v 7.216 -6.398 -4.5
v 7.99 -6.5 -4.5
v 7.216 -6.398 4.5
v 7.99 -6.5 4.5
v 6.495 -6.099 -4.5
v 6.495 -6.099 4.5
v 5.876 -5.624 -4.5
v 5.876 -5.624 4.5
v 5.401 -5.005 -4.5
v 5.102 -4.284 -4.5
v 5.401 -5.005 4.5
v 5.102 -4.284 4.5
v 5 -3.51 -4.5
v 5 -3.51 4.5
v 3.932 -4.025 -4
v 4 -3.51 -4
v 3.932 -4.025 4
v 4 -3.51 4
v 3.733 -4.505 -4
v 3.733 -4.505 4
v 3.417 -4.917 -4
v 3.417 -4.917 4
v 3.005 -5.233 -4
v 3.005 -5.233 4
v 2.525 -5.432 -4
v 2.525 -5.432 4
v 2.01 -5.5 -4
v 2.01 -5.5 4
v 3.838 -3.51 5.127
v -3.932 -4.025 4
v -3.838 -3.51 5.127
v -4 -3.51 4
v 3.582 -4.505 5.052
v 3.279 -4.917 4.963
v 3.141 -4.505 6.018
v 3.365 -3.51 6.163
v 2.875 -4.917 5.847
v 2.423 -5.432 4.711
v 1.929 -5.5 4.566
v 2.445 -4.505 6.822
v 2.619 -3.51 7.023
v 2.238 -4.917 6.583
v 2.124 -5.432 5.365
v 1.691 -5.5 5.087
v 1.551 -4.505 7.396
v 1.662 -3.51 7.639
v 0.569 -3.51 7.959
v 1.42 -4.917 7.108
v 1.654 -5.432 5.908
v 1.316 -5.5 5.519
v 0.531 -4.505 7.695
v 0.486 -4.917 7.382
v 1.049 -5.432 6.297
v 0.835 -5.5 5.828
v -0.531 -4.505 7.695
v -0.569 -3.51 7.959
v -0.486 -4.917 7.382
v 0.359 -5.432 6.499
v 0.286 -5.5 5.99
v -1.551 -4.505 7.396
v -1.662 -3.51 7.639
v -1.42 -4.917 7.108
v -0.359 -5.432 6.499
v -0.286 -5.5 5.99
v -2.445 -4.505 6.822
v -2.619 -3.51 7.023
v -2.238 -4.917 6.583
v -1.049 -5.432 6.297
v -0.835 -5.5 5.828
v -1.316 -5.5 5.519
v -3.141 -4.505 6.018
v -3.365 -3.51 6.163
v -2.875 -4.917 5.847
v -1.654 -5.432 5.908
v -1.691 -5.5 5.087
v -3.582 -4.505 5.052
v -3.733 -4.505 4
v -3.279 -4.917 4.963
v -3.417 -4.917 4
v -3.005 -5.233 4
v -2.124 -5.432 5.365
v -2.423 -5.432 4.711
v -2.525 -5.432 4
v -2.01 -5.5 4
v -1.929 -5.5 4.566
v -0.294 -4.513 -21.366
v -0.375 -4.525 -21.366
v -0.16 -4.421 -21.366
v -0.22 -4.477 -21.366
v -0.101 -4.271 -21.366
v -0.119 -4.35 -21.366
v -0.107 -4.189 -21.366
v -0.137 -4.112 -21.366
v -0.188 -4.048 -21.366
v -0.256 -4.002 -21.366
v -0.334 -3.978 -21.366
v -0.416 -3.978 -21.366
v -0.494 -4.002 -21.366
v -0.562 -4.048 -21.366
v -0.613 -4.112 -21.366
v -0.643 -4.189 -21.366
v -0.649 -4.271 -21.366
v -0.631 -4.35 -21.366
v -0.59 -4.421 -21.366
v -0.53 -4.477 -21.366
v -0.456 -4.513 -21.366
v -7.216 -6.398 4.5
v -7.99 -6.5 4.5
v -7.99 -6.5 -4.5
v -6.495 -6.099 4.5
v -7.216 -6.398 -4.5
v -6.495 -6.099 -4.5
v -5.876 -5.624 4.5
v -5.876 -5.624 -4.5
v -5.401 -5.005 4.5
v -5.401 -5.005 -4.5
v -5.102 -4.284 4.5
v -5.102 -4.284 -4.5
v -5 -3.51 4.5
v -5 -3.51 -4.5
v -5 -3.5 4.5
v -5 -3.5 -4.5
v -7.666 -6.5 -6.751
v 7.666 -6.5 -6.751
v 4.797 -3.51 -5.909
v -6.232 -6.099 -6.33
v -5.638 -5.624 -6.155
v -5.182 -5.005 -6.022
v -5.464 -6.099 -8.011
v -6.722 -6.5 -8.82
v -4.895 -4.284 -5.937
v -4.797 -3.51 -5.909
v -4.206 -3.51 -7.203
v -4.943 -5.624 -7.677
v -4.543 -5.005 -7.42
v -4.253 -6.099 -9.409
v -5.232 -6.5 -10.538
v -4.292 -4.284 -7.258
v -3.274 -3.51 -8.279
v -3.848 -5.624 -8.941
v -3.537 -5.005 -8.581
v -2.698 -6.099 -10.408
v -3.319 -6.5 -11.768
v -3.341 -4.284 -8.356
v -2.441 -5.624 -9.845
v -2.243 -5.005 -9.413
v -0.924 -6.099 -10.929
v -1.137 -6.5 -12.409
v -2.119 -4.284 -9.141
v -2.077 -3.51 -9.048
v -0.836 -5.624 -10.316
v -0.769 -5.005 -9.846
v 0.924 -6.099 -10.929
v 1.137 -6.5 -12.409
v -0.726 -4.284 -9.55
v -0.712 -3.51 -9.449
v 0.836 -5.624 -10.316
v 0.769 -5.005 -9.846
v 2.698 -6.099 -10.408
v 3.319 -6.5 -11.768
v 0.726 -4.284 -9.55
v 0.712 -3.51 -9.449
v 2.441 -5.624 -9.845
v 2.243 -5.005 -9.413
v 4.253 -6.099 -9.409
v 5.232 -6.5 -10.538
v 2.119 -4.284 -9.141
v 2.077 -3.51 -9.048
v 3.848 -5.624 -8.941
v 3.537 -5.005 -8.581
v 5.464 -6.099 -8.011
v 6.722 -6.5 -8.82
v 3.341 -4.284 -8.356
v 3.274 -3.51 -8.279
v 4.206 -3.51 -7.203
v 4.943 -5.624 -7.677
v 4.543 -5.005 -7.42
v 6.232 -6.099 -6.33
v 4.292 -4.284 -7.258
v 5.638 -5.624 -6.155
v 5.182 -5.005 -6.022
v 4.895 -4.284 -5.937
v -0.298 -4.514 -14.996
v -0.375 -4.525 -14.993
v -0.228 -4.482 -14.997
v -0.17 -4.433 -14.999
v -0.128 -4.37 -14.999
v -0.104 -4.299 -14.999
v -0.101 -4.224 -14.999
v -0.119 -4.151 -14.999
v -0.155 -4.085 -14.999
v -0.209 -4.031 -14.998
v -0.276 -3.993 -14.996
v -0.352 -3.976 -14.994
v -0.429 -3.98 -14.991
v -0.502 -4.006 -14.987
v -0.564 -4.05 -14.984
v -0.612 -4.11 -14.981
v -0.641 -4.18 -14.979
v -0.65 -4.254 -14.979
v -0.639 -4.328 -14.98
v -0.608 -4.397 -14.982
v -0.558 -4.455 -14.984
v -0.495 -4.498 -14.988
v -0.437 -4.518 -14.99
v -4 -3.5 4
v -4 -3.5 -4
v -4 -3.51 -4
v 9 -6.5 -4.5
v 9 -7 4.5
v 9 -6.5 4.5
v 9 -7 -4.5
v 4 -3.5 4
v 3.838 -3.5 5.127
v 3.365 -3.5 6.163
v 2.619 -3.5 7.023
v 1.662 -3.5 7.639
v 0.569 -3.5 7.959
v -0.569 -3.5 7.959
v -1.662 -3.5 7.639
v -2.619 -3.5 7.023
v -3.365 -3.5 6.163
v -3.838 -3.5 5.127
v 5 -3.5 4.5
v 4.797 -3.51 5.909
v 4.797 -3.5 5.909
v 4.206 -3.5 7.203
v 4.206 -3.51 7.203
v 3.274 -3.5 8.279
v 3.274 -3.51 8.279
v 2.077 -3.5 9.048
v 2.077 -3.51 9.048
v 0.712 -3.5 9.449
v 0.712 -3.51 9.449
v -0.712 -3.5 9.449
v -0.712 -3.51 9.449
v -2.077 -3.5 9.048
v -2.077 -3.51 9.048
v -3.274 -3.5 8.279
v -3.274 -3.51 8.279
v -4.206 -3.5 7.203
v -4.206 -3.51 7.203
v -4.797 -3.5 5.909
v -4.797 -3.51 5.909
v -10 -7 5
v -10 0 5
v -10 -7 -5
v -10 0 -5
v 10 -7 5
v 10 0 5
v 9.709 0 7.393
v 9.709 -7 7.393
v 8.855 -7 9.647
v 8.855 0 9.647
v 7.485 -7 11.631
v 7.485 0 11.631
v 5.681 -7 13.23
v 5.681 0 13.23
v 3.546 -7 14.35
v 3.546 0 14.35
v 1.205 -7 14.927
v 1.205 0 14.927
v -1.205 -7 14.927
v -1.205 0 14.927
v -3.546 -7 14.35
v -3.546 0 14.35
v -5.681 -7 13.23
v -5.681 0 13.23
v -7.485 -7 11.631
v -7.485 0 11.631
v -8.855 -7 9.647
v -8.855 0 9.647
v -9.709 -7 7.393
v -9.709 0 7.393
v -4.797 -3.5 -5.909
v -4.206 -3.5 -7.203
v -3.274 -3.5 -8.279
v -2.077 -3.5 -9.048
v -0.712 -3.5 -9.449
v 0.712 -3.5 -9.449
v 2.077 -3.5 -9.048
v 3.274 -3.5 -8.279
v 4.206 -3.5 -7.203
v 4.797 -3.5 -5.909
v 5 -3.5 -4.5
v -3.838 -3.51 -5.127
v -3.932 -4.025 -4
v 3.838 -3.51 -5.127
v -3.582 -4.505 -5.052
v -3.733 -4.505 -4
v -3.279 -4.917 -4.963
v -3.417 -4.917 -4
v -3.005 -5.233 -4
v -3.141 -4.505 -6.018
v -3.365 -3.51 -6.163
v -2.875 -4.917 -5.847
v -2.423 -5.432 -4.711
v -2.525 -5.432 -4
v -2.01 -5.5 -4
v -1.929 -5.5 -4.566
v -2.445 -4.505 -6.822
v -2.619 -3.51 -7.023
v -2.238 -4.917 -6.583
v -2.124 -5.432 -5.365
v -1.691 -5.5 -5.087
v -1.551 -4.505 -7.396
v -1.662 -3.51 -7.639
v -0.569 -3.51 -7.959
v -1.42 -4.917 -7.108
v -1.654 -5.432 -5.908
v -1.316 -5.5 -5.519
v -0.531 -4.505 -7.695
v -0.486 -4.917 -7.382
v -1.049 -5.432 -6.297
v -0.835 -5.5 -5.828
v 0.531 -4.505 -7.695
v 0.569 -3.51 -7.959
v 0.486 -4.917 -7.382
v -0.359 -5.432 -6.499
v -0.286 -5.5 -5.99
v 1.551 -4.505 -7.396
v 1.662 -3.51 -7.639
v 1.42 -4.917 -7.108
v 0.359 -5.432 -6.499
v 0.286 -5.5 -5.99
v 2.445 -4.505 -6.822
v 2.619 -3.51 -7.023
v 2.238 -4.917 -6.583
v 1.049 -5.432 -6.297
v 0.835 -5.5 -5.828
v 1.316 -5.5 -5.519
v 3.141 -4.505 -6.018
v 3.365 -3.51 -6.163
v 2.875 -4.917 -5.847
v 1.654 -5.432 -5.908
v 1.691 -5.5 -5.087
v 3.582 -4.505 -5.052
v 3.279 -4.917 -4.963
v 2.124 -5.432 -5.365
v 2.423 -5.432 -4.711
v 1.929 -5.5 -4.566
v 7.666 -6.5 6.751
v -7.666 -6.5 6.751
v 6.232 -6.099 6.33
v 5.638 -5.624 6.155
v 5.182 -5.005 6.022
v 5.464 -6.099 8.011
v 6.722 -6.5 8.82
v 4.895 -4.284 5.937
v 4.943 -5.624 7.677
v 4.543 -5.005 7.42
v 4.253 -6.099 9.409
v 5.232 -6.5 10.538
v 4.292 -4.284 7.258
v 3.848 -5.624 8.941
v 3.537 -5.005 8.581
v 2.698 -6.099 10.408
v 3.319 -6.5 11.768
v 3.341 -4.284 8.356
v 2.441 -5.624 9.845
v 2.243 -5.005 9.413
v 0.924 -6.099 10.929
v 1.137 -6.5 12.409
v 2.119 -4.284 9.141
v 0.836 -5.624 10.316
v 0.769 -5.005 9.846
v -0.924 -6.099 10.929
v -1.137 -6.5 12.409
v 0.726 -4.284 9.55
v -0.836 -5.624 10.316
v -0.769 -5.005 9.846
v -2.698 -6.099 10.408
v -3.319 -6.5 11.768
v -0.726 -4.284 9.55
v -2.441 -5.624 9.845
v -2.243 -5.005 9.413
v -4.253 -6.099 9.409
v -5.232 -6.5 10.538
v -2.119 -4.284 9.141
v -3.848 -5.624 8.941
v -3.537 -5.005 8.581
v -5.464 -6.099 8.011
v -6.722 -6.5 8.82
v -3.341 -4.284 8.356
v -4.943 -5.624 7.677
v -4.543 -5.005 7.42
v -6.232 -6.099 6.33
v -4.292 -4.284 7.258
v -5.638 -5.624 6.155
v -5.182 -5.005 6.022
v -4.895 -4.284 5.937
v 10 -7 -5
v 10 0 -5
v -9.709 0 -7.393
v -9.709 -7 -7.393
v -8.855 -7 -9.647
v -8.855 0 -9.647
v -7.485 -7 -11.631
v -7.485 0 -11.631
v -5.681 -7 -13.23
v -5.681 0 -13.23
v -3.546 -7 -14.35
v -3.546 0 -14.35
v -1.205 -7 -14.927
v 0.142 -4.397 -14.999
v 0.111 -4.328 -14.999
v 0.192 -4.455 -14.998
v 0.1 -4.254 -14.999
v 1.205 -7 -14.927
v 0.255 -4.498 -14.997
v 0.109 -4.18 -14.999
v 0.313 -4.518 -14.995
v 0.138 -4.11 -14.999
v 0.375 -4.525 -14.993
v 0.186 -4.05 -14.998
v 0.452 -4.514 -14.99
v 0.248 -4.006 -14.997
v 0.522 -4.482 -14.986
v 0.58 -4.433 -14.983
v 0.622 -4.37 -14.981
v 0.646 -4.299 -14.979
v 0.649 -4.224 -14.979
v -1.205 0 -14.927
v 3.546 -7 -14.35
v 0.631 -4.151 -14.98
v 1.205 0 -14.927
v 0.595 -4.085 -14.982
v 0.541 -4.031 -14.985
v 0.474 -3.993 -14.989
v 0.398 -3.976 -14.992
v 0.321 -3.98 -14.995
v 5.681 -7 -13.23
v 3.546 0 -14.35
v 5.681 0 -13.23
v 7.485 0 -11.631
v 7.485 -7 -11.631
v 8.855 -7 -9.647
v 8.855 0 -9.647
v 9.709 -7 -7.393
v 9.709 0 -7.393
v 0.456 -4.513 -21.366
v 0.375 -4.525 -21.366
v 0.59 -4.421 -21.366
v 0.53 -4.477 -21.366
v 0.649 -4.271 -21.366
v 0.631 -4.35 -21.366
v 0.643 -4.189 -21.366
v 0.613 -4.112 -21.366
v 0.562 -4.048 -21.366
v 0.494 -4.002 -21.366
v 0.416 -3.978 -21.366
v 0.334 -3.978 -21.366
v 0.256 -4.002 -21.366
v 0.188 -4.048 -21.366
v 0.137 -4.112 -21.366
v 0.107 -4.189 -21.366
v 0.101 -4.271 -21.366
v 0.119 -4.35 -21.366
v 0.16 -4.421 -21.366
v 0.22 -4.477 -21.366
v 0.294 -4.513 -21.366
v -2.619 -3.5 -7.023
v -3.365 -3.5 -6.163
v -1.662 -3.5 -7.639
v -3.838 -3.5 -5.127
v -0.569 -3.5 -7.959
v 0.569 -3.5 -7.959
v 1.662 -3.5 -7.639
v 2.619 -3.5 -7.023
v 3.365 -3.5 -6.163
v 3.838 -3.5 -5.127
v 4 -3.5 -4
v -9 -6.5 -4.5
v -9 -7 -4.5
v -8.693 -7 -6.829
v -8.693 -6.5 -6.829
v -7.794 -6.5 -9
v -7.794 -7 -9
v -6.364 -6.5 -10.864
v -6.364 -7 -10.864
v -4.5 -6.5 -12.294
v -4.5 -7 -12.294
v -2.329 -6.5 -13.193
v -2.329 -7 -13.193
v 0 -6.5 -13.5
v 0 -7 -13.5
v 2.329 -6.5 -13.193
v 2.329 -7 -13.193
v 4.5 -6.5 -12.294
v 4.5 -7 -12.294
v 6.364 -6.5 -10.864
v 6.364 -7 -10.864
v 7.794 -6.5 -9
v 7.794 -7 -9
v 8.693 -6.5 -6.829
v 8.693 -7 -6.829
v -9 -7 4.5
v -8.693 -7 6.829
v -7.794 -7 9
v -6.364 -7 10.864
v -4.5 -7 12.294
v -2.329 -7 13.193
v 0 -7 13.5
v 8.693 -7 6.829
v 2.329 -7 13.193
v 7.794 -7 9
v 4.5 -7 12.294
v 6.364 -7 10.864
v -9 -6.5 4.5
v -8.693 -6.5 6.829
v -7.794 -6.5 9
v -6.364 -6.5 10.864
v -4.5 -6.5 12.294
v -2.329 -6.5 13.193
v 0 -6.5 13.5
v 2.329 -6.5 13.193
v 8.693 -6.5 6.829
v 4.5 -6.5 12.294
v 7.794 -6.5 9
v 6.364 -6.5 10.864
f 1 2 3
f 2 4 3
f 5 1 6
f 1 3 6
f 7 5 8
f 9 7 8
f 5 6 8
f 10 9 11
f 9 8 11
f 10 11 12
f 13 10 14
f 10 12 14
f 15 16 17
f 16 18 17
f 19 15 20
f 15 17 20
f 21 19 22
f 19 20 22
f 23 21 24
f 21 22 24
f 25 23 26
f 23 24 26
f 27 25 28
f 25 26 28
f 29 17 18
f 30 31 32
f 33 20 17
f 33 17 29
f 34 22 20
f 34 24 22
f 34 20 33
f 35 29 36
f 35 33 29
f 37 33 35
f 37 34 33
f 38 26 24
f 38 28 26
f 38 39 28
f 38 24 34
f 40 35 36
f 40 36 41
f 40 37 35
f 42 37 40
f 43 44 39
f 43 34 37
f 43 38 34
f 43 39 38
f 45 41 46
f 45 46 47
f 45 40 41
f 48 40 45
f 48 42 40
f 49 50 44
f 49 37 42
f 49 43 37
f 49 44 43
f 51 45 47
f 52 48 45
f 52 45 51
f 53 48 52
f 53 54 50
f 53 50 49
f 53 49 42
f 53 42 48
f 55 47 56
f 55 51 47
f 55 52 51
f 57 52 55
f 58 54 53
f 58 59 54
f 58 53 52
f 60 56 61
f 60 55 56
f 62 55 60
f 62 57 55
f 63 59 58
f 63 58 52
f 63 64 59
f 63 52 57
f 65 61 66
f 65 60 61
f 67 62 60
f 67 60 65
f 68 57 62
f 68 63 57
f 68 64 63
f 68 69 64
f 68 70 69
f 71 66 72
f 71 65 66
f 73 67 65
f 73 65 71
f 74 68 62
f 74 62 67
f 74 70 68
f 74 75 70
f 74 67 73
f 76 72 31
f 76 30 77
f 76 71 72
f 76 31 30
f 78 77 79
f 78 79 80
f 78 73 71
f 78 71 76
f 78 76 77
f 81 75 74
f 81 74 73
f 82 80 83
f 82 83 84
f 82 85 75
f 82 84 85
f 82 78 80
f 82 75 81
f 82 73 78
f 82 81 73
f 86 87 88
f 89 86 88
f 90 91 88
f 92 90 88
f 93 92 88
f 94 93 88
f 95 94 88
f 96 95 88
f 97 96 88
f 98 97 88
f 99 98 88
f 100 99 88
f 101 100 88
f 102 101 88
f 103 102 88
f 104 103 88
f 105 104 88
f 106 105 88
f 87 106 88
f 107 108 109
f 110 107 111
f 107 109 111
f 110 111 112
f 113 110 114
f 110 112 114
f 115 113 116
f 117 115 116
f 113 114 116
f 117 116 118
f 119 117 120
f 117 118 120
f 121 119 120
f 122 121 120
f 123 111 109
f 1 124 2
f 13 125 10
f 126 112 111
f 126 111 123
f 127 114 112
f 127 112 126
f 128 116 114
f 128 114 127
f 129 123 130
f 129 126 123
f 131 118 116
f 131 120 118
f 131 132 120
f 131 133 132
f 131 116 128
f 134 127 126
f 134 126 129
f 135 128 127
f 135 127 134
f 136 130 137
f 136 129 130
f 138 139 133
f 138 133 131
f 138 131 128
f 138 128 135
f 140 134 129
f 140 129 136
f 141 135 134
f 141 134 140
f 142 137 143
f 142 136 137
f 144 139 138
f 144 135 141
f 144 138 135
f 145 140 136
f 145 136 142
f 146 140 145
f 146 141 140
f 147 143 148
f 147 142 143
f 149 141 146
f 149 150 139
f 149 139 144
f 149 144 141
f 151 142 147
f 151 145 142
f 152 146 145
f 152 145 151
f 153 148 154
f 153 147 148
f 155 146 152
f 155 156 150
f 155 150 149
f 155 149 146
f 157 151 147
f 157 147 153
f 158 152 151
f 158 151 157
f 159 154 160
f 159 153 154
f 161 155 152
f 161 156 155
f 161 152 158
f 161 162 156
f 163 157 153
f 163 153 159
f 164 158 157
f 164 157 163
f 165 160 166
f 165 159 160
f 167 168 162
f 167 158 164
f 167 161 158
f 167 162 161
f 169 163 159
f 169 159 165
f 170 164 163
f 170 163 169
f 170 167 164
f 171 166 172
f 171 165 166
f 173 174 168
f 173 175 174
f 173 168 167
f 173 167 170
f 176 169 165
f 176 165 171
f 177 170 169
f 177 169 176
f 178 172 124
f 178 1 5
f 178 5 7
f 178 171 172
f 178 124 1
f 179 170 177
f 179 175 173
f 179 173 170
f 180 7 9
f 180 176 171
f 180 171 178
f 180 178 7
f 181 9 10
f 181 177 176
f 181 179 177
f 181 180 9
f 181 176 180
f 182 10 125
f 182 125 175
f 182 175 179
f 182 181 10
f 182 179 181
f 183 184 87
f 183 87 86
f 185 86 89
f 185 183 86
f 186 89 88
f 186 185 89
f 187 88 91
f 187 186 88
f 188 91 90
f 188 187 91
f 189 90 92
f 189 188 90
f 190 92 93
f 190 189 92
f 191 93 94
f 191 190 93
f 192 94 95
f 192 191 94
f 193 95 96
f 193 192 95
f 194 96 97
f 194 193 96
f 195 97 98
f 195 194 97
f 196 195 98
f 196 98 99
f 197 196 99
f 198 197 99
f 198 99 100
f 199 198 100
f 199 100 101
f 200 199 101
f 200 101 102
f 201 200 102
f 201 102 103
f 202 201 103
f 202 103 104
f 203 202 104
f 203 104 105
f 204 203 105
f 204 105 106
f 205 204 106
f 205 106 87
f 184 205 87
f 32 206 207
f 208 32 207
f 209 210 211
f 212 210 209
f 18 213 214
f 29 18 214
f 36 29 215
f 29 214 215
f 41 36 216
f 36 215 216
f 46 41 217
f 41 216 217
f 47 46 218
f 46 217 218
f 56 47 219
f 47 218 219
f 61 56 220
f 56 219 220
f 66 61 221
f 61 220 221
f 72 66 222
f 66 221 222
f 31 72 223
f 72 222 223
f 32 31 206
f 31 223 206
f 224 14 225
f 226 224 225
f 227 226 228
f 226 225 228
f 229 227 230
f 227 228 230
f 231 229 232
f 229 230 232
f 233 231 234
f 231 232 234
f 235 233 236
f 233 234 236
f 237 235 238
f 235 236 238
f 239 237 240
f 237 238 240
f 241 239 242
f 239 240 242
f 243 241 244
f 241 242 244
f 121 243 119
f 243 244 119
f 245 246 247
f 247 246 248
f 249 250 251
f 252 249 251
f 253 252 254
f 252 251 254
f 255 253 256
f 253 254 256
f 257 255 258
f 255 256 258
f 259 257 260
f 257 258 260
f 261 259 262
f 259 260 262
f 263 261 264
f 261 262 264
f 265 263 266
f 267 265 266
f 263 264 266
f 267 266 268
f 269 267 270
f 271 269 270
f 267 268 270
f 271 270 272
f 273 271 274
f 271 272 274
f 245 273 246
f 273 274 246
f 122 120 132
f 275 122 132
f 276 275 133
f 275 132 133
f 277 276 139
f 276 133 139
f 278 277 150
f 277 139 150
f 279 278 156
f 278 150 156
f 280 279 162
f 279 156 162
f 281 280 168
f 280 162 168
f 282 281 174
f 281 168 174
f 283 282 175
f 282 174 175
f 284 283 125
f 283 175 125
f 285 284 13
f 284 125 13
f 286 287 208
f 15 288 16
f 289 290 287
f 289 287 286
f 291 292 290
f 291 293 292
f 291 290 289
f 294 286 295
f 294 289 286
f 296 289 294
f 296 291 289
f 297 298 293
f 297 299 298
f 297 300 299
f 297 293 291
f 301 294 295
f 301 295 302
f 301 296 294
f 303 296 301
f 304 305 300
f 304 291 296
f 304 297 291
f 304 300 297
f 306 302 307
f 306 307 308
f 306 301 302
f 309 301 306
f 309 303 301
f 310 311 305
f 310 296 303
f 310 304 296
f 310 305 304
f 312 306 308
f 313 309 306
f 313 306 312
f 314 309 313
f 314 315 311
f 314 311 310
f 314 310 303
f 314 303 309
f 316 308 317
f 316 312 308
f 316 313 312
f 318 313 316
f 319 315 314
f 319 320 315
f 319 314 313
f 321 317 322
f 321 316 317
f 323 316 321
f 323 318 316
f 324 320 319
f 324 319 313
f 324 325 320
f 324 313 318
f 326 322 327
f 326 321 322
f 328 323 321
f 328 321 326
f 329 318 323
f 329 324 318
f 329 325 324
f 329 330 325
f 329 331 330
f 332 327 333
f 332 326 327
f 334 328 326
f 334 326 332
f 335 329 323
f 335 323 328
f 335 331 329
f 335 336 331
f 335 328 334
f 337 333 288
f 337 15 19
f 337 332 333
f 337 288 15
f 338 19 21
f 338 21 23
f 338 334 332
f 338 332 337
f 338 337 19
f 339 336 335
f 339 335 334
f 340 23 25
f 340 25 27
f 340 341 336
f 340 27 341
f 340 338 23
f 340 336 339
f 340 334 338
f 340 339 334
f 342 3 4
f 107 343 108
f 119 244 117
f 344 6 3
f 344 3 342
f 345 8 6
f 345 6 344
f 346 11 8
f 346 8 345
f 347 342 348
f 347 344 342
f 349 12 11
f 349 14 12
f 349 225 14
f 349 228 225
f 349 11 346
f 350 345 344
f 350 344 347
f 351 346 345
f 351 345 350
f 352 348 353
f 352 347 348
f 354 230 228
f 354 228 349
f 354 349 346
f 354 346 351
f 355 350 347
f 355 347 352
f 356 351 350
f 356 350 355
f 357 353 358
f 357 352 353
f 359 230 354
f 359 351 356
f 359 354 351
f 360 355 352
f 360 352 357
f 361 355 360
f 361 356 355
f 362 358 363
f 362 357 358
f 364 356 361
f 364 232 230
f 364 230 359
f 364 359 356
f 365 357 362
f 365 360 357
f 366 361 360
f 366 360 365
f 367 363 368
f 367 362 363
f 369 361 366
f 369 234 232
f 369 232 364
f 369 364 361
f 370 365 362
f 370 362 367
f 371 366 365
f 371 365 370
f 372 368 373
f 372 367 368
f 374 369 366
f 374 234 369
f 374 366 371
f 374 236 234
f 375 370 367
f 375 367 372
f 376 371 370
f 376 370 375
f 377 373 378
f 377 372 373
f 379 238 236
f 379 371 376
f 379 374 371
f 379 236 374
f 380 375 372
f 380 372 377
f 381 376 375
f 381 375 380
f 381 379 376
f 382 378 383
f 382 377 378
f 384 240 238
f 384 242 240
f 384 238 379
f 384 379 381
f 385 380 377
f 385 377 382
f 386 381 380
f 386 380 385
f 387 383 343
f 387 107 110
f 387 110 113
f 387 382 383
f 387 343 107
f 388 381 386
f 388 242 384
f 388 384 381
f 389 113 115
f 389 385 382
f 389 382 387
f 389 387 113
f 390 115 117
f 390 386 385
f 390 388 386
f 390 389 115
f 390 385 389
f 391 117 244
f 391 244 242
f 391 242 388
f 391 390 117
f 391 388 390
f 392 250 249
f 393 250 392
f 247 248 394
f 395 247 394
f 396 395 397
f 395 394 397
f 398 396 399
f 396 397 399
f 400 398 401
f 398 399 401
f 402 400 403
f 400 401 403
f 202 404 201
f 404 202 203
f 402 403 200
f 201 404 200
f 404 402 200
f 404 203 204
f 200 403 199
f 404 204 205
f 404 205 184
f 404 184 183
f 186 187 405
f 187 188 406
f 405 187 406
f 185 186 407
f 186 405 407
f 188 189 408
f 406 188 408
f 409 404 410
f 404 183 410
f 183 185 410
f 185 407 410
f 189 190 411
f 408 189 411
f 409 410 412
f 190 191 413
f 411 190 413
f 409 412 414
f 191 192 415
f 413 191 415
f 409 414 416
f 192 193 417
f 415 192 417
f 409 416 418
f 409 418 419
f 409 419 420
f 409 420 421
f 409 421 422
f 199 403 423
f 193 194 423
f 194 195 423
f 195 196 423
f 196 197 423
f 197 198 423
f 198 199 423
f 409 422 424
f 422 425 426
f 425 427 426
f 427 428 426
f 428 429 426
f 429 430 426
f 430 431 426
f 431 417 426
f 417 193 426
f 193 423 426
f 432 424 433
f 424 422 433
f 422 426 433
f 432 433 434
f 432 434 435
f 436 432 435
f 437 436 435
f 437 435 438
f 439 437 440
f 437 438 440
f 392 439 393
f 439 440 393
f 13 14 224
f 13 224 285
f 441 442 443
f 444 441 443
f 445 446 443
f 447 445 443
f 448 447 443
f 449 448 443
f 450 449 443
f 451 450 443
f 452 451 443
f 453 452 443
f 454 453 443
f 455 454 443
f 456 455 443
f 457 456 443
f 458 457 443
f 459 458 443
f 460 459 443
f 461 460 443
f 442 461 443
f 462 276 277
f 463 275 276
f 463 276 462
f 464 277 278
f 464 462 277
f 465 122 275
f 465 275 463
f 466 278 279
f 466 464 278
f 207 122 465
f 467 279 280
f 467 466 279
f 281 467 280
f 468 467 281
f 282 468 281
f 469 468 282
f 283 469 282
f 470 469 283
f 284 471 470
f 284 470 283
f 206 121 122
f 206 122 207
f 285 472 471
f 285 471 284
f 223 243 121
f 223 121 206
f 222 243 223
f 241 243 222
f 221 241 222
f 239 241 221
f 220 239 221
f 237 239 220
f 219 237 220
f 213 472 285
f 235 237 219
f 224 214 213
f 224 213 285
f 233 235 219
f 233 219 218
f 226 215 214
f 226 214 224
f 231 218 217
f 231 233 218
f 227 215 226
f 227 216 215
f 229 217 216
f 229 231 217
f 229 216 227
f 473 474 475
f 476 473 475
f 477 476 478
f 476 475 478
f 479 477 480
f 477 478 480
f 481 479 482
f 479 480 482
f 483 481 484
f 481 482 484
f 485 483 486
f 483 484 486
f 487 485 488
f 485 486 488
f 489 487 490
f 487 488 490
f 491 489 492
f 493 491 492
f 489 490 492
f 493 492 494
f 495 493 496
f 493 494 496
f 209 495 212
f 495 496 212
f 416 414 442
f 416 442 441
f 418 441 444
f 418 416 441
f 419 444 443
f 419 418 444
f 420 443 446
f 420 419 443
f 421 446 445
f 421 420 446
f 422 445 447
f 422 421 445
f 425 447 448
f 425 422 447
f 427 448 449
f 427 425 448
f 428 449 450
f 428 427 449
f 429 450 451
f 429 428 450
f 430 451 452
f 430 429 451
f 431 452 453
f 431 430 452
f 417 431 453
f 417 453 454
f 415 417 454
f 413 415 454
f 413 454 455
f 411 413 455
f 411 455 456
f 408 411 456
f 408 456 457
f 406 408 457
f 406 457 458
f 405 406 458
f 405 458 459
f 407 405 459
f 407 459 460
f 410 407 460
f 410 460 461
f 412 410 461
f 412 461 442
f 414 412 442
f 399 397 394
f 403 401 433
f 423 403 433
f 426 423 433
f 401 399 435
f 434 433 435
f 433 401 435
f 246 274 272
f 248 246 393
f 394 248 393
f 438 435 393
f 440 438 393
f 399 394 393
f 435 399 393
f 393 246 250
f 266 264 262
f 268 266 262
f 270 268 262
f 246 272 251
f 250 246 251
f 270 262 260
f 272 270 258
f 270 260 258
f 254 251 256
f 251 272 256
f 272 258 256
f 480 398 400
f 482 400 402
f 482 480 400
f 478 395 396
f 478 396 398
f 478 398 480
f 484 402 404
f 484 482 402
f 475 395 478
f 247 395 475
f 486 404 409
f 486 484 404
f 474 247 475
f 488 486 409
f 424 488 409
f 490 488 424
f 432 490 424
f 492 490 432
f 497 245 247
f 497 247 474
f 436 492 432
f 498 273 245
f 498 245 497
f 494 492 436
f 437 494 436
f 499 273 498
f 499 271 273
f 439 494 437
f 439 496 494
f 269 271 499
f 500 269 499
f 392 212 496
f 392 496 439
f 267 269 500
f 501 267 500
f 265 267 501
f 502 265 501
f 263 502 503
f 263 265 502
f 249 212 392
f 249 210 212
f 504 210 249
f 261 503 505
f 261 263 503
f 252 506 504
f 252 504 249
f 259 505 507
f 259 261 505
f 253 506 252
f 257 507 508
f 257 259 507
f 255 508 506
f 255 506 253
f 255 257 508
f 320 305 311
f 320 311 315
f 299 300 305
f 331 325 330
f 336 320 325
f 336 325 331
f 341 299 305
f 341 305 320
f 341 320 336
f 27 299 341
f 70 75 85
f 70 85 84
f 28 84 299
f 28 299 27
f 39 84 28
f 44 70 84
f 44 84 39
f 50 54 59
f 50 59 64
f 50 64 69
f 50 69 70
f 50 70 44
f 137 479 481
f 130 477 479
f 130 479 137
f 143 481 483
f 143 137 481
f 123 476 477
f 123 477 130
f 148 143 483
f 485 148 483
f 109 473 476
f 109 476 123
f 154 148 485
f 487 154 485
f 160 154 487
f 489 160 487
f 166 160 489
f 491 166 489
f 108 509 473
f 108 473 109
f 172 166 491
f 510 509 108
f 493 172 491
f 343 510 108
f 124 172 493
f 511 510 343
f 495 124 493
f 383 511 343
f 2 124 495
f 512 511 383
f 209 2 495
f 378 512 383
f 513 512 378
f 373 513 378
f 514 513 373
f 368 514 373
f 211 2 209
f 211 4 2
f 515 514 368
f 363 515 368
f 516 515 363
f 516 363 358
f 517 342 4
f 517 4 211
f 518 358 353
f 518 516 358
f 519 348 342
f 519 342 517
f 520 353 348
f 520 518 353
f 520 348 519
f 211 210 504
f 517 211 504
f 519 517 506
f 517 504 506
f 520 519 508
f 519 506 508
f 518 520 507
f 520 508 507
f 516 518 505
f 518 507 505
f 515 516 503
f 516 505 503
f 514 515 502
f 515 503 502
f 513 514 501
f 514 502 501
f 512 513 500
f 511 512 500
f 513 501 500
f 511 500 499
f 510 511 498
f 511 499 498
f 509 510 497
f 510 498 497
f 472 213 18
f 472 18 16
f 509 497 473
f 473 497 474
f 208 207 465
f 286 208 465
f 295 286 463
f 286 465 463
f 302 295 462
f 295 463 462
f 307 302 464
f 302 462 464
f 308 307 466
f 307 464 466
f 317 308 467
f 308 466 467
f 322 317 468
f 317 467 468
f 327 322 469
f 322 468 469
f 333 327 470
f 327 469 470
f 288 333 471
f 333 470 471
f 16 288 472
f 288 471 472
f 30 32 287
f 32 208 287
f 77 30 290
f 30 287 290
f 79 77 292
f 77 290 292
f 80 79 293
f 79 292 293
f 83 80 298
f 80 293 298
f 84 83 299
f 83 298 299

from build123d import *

# Parameters (mm, degrees)
PAD_DEPTH       = 7
POCKET_DEPTH    = 0.5
POCKET001_DEPTH = 3
FILLET_R        = 2.99
PAD001_DEPTH    = 2
FILLET001_R     = 1.99
SKETCH004_R     = 0.275
PAD002_DEPTH    = 10


with BuildPart() as part:
    # Sketch → Pad (new body)
    with BuildSketch(Plane.XZ):
        with BuildLine():
            ThreePointArc((10, 5), (0, 15), (-10, 5))
            Line((-10, 5), (-10, -5))
            ThreePointArc((-10, -5), (0, -15), (10, -5))
            Line((10, 5), (10, -5))
        make_face()
    extrude(amount=PAD_DEPTH)

    # Sketch001 (on Face6 of Pad) → Pocket (cut)
    with BuildSketch(Plane.XZ.offset(7)):
        with BuildLine():
            ThreePointArc((9, 4.5), (0, 13.5), (-9, 4.5))
            Line((-9, 4.5), (-9, -4.5))
            ThreePointArc((-9, -4.5), (0, -13.5), (9, -4.5))
            Line((9, 4.5), (9, -4.5))
        make_face()
    extrude(amount=-POCKET_DEPTH, mode=Mode.SUBTRACT)

    # Sketch002 (on Face11 of Pocket) → Pocket001 (cut)
    with BuildSketch(Plane.XZ.offset(6.5)):
        with BuildLine():
            ThreePointArc((5, 4.5), (0, 9.5), (-5, 4.5))
            Line((-5, 4.5), (-5, -4.5))
            ThreePointArc((-5, -4.5), (0, -9.5), (5, -4.5))
            Line((5, 4.5), (5, -4.5))
        make_face()
    extrude(amount=-POCKET001_DEPTH, mode=Mode.SUBTRACT)

    # Fillet
    fillet_edges = [part.edges().sort_by_distance(p)[0] for p in [
        (0, -6.5, 9.5),
        (5, -6.5, 0),
        (-5, -6.5, 0),
        (0, -6.5, -9.5),
    ]]
    fillet(fillet_edges, radius=FILLET_R)

    # Sketch003 (on Face15 of Fillet) → Pad001 (join)
    with BuildSketch(Plane.XZ.offset(3.5)):
        with BuildLine():
            ThreePointArc((4, 4), (0, 8), (-4, 4))
            Line((-4, 4), (-4, -4))
            ThreePointArc((-4, -4), (0, -8), (4, -4))
            Line((4, 4), (4, -4))
        make_face()
    extrude(amount=PAD001_DEPTH)

    # Fillet001
    fillet001_edges = [part.edges().sort_by_distance(p)[0] for p in [
        (-4, -5.5, 0),
        (0, -5.5, -8),
        (4, -5.5, 0),
        (0, -5.5, 8),
    ]]
    fillet(fillet001_edges, radius=FILLET001_R)

    # Sketch004 (on DatumPlane) → Pad002 (join)
    with BuildSketch(Plane(origin=(0, -3.5, -11.366198), x_dir=(0, -1, 0), z_dir=(0, 0, 1))):
        with Locations((0.75, 0.375)):
            Circle(SKETCH004_R)
        with Locations((0.75, -0.375)):
            Circle(SKETCH004_R)
    extrude(amount=-PAD002_DEPTH)


solid = part.part
